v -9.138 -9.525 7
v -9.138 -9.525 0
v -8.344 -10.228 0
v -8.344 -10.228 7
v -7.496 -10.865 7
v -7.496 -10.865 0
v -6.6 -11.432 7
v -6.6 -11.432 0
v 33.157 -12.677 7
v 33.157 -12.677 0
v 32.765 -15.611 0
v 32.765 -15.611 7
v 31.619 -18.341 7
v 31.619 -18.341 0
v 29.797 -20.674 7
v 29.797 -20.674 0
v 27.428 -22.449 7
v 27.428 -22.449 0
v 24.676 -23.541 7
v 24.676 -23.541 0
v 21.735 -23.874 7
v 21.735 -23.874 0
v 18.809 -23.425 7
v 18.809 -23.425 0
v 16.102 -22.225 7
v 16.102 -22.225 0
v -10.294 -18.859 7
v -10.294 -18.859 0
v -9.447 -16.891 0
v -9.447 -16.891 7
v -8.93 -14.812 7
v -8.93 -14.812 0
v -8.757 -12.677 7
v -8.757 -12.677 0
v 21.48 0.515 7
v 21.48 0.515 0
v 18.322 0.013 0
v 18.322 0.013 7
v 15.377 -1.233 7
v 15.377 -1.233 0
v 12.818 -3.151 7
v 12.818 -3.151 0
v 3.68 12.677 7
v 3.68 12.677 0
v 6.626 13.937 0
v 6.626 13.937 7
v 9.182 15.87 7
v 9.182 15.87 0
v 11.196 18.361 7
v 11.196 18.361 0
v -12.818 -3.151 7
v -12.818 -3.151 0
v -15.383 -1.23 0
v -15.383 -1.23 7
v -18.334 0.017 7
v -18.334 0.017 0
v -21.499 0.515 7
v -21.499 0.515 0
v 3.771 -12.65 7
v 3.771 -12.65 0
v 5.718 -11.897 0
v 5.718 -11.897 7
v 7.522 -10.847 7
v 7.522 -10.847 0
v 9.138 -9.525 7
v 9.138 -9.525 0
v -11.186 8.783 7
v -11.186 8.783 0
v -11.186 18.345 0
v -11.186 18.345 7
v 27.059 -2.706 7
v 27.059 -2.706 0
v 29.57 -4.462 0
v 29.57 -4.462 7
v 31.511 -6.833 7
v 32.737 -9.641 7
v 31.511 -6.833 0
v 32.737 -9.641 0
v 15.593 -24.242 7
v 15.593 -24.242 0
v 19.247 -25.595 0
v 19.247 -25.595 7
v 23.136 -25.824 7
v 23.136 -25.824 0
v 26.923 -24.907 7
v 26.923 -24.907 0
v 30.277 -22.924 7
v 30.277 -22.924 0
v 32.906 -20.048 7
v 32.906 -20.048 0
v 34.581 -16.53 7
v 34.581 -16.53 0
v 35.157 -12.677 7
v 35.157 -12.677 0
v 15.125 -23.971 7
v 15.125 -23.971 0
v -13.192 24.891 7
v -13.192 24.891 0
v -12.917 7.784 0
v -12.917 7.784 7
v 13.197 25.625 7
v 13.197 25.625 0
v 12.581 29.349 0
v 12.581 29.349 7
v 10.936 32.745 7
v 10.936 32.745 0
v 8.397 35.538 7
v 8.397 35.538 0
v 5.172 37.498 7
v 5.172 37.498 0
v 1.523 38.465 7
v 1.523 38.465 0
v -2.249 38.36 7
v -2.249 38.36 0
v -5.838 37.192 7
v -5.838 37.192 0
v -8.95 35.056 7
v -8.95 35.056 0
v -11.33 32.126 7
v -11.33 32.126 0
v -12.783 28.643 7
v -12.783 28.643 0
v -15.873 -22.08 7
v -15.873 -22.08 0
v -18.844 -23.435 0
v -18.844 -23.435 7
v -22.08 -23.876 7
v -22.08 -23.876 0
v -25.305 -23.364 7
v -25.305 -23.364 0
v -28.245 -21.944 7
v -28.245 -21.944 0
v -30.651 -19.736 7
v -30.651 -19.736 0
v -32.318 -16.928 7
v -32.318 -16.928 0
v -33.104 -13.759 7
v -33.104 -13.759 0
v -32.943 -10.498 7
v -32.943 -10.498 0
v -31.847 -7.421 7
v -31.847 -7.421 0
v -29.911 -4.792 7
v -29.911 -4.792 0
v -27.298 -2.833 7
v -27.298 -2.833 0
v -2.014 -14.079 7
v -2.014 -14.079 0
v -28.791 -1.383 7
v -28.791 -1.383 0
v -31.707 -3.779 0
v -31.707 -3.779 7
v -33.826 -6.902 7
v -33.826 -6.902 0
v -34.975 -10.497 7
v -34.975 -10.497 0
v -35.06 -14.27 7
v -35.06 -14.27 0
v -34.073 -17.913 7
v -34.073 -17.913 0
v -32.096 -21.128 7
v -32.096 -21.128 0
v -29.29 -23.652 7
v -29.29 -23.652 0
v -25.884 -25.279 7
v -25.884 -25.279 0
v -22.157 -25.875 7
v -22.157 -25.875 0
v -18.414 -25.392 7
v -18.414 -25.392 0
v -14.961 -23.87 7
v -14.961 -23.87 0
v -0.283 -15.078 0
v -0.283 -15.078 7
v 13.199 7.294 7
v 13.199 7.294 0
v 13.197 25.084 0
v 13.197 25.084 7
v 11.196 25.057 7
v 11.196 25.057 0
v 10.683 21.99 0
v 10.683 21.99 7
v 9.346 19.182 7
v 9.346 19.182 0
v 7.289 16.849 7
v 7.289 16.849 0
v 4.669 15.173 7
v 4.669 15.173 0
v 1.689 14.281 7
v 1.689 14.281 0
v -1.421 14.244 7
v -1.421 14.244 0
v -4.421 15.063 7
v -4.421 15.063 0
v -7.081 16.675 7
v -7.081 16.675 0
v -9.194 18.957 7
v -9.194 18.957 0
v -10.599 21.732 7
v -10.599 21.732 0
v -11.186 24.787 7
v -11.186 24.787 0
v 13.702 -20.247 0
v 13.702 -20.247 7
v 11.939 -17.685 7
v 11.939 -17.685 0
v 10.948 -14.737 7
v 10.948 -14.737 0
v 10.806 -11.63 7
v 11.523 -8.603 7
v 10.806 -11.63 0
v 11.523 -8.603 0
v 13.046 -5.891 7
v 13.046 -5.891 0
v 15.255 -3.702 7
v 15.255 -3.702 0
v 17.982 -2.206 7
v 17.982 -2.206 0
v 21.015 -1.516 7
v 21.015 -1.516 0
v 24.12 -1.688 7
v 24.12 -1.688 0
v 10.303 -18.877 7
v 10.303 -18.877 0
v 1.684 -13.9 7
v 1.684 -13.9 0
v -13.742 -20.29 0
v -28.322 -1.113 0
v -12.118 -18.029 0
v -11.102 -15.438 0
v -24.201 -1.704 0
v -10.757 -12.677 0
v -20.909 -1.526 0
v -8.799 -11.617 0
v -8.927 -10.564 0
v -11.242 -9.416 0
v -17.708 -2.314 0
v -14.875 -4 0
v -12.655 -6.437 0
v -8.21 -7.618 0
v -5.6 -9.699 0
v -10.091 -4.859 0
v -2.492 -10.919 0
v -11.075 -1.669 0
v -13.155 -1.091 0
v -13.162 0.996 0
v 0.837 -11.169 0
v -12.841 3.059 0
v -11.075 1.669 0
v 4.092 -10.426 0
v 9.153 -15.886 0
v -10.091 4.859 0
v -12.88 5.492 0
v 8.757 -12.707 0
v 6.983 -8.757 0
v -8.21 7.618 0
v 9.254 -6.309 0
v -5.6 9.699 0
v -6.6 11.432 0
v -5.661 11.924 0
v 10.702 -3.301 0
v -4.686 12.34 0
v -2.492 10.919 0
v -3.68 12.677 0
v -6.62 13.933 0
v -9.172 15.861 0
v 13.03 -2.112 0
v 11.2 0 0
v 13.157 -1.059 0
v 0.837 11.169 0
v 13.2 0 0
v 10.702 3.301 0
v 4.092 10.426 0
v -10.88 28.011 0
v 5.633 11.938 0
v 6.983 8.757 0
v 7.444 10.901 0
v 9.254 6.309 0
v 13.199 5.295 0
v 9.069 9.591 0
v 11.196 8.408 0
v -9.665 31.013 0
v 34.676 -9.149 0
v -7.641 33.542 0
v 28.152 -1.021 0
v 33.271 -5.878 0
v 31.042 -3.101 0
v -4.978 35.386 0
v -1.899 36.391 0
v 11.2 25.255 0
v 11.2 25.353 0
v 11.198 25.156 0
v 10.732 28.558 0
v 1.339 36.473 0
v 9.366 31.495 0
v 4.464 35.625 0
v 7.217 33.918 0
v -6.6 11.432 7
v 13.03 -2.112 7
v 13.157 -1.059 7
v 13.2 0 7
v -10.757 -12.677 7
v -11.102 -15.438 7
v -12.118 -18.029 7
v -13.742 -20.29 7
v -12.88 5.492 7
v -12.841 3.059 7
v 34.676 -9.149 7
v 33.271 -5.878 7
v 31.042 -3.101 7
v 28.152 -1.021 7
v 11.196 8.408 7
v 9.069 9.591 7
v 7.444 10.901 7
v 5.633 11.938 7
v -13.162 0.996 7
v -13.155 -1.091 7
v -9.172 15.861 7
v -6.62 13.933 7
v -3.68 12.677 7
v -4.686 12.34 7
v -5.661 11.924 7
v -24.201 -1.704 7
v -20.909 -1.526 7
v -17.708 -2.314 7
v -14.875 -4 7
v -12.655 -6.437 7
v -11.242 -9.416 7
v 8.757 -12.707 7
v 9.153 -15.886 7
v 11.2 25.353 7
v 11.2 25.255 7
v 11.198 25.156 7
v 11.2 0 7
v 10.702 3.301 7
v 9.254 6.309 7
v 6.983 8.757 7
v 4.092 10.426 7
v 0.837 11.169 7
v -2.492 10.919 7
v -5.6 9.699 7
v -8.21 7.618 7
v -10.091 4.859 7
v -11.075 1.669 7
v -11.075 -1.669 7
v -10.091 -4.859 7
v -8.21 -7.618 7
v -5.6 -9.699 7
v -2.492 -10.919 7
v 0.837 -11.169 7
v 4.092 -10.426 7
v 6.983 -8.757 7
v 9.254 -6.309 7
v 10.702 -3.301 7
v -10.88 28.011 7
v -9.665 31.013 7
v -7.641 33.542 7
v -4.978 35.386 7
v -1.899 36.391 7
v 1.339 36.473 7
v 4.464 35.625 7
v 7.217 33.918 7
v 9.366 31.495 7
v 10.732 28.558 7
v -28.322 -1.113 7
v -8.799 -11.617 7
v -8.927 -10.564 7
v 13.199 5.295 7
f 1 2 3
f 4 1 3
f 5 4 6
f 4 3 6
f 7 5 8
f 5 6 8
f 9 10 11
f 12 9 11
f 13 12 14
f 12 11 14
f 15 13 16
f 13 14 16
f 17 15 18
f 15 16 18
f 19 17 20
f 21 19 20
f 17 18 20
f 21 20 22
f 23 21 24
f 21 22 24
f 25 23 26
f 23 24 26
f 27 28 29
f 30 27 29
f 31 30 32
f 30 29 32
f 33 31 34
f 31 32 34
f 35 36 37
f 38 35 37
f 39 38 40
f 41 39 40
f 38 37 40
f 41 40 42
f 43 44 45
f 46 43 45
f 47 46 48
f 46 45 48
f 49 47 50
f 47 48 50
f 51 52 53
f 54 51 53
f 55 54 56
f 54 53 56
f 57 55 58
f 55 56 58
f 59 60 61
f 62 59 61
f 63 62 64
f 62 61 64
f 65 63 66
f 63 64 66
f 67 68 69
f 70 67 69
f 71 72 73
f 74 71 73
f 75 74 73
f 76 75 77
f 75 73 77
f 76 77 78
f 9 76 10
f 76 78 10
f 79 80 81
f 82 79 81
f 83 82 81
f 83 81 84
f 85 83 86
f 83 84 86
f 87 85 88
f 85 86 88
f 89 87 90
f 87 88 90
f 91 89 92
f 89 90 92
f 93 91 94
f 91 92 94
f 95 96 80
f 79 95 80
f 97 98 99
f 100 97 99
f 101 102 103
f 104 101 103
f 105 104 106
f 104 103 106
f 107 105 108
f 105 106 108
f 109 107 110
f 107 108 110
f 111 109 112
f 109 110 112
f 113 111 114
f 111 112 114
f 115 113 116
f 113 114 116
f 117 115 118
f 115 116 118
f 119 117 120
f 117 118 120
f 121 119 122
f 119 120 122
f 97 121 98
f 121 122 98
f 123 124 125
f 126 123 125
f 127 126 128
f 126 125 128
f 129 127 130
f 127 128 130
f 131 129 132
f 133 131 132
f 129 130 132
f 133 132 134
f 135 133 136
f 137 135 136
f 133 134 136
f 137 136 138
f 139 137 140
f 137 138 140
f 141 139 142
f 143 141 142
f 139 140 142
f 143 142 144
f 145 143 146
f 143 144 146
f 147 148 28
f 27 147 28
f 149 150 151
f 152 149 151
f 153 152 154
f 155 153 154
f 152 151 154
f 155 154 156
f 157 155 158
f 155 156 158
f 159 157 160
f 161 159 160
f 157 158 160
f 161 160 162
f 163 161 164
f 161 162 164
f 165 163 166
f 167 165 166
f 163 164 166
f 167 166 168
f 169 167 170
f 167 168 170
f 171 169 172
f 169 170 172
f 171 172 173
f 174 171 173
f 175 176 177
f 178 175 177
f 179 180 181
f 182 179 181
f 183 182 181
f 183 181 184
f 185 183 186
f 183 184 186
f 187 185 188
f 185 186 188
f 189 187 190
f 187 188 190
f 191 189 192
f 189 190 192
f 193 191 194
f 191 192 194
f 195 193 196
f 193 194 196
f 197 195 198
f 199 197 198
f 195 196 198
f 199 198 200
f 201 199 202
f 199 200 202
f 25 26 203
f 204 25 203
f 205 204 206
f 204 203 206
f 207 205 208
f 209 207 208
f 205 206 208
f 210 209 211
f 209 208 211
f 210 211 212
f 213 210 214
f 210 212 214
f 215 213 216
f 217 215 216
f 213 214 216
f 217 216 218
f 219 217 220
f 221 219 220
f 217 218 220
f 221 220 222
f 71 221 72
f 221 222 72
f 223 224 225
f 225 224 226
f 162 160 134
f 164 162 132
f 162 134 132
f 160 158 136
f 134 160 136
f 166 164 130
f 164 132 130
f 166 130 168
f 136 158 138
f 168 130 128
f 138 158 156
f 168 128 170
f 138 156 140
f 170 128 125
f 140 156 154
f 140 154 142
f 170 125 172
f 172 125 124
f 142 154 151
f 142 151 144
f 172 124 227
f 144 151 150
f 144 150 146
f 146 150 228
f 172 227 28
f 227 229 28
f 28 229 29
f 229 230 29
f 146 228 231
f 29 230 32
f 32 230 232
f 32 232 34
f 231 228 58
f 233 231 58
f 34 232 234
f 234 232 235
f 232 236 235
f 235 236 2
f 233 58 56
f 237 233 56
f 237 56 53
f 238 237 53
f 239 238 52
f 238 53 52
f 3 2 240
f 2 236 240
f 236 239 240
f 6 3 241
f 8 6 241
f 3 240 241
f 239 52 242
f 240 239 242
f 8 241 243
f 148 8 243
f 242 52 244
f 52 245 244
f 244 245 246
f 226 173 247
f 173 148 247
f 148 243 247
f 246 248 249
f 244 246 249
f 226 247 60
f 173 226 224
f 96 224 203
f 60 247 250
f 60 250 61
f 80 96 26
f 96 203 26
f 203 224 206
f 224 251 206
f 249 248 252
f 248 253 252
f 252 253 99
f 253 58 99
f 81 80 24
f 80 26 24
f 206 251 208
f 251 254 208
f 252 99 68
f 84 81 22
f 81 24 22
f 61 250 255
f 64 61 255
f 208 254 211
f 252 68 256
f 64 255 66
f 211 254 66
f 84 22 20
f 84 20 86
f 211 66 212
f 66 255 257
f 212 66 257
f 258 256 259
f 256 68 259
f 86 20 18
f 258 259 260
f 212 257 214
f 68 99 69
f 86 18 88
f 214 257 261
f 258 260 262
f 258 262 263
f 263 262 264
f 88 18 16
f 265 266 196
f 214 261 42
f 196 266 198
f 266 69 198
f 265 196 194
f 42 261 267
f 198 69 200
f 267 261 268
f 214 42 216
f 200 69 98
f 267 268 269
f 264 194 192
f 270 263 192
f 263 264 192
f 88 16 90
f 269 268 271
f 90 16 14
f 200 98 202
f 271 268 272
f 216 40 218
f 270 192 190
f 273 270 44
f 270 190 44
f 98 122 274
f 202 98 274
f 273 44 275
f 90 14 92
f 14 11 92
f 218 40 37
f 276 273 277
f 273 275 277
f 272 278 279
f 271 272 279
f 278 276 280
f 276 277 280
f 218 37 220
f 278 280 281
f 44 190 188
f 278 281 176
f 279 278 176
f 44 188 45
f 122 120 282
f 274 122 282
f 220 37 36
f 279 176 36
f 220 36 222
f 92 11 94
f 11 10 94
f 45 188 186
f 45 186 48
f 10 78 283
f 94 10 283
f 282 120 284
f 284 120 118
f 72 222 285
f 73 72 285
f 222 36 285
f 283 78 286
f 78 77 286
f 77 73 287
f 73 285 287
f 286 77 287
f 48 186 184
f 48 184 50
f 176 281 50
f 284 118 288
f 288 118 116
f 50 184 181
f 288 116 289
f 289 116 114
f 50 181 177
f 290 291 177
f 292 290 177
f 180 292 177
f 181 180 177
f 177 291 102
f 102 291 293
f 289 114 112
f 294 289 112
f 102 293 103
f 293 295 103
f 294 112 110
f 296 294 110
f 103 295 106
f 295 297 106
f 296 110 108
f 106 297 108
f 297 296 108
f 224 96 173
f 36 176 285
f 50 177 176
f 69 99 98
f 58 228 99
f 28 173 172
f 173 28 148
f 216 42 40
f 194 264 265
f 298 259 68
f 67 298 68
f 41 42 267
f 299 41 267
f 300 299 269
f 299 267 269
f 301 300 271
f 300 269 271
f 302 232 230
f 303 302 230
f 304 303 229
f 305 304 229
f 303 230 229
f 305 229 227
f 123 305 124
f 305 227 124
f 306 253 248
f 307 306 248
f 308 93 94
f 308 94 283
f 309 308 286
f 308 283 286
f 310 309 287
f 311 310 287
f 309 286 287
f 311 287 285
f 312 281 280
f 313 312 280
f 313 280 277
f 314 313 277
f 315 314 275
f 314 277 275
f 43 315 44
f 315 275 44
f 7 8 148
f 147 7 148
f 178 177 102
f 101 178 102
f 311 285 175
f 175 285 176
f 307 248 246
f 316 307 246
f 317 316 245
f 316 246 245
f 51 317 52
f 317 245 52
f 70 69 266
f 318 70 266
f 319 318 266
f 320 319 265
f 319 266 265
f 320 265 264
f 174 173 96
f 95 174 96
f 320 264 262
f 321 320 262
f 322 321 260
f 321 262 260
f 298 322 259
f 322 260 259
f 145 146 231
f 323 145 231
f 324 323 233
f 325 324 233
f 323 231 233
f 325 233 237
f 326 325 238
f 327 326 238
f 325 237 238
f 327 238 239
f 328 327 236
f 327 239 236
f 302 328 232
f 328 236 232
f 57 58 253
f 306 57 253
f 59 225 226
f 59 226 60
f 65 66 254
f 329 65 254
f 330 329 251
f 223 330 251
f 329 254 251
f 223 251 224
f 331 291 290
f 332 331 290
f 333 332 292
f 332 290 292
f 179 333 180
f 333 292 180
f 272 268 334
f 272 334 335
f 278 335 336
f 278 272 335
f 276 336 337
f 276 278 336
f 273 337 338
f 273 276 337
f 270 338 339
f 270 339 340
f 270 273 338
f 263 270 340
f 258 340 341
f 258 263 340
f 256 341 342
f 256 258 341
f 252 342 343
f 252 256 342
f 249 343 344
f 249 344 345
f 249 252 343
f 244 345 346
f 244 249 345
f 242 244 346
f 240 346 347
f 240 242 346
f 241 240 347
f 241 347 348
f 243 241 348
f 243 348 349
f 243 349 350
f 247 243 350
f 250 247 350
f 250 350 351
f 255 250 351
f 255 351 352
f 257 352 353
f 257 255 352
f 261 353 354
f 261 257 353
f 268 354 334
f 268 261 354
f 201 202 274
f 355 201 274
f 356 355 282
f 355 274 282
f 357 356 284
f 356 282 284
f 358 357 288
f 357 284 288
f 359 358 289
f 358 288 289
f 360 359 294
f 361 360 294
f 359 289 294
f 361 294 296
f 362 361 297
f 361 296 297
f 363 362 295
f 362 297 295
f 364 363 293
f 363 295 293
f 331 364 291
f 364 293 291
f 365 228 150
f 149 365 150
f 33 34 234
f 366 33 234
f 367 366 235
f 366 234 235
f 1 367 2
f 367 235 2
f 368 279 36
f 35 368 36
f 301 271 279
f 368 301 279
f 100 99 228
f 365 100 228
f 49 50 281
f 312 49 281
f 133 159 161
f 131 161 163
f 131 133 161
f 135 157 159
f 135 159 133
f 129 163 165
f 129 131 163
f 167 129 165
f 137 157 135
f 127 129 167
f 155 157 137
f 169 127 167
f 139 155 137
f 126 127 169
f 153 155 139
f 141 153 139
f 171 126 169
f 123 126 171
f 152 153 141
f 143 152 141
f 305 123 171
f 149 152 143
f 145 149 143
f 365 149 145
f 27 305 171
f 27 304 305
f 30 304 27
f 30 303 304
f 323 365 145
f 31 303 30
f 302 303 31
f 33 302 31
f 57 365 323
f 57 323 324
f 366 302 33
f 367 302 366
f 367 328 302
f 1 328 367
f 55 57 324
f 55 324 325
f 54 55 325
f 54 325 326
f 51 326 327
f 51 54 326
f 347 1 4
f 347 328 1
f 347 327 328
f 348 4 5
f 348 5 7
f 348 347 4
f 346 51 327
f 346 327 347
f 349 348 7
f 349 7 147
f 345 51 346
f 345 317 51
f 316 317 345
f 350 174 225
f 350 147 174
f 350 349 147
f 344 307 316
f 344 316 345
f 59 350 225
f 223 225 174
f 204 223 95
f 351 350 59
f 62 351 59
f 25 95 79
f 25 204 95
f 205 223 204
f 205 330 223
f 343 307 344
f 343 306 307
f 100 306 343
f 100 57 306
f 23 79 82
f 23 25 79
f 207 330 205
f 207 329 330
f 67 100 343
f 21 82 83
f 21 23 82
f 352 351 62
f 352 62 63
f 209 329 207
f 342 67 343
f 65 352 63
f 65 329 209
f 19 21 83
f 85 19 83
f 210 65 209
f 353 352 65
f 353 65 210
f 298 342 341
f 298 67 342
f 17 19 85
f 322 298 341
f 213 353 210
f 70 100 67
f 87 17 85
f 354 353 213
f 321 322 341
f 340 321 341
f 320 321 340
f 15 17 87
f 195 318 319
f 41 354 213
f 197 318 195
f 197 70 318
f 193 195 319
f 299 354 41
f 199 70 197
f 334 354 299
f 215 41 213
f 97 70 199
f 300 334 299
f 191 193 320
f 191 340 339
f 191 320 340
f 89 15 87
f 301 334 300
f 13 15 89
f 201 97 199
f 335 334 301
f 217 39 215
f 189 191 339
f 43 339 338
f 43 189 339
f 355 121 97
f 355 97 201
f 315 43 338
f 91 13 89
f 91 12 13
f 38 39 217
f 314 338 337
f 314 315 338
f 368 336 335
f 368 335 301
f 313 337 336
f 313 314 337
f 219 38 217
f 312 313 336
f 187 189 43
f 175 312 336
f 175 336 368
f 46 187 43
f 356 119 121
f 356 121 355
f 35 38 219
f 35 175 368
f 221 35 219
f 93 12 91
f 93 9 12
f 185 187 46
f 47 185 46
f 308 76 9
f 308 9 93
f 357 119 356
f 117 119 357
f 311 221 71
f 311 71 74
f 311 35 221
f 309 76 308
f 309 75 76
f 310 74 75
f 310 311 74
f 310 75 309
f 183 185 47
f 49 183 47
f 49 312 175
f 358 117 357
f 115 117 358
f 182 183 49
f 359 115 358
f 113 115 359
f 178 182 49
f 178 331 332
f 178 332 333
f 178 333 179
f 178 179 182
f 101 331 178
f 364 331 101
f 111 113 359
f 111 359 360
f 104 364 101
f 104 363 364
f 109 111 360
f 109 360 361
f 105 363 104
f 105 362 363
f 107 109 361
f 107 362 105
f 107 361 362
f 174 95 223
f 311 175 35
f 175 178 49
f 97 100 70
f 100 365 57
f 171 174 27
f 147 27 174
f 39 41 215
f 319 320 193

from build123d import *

# Parameters (mm, degrees)
F0_R     = 11.2
F1_DEPTH = 7


with BuildPart() as f1:
    # F0 (on Top) → F1 (new body)
    with BuildSketch(Plane.XY):
        with BuildLine():
            ThreePointArc((11.1960937773, 18.3612549308), (12.6514347683, 21.5874202803), (13.1972607258, 25.0843095102))
            Line((13.1972607258, 25.0843095102), (13.1972016792, 25.6249998472))
            ThreePointArc((13.1972016792, 25.6249998472), (-0.3668592076, 38.5481145369), (-13.1919155694, 24.8913004743))
            ThreePointArc((-13.1919155694, 24.8913004743), (-12.6206771495, 21.4855903841), (-11.1856658992, 18.3445846116))
            Line((-11.1856658992, 18.3445846116), (-11.1856658992, 24.7867521761))
            ThreePointArc((-11.1856658992, 24.7867521761), (-0.2833213093, 36.5496293654), (11.2, 25.353213464))
            ThreePointArc((11.2, 25.353213464), (11.1990234017, 25.2053119859), (11.1960937773, 25.0574363006))
            Line((11.1960937773, 25.0574363006), (11.1960937773, 18.3612549308))
        make_face()
        with BuildLine():
            ThreePointArc((-11.1856658992, 18.3445846116), (-12.6206771495, 21.4855903841), (-13.1919155694, 24.8913004743))
            Line((-13.1919155694, 24.8913004743), (-12.91669885, 7.7836678209))
            Line((-12.91669885, 7.7836678209), (-11.1856658992, 8.7833322288))
            Line((-11.1856658992, 8.7833322288), (-11.1856658992, 18.3445846116))
        make_face()
        with BuildLine():
            Line((11.1960937773, 8.4082804197), (13.1992034925, 7.2943554266))
            Line((13.1992034925, 7.2943554266), (13.1972607258, 25.0843095102))
            ThreePointArc((13.1972607258, 25.0843095102), (12.6514347683, 21.5874202803), (11.1960937773, 18.3612549308))
            Line((11.1960937773, 18.3612549308), (11.1960937773, 8.4082804197))
        make_face()
        with BuildLine():
            ThreePointArc((-3.6801687137, 12.676606732), (0, 12.153213464), (3.6801687137, 12.676606732))
            ThreePointArc((3.6801687137, 12.676606732), (0, 13.2), (-3.6801687137, 12.676606732))
        make_face()
        with BuildLine():
            ThreePointArc((-3.6801687137, 12.676606732), (0, 13.2), (3.6801687137, 12.676606732))
            ThreePointArc((3.6801687137, 12.676606732), (7.9627007172, 14.8253743083), (11.1960937773, 18.3612549308))
            Line((11.1960937773, 18.3612549308), (11.1960937773, 25.0574363006))
            ThreePointArc((11.1960937773, 25.0574363006), (0.1354424563, 14.154032452), (-11.1856658992, 24.7867521761))
            Line((-11.1856658992, 24.7867521761), (-11.1856658992, 18.3445846116))
            ThreePointArc((-11.1856658992, 18.3445846116), (-7.9548571952, 14.8194464738), (-3.6801687137, 12.676606732))
        make_face()
        with BuildLine():
            ThreePointArc((11.1960937773, 6.9919585332), (11.4364479512, 6.5914837677), (11.6624835815, 6.1827564008))
            Line((11.6624835815, 6.1827564008), (13.1994217896, 5.2954047126))
            Line((13.1994217896, 5.2954047126), (13.1992034925, 7.2943554266))
            Line((13.1992034925, 7.2943554266), (11.1960937773, 8.4082804197))
            Line((11.1960937773, 8.4082804197), (11.1960937773, 6.9919585332))
        make_face()
        with BuildLine():
            Line((13.1992034925, 7.2943554266), (13.1994217896, 5.2954047126))
            Line((13.1994217896, 5.2954047126), (21.4797092452, 0.5147785212))
            ThreePointArc((21.4797092452, 0.5147785212), (24.9174056627, 0.1870318324), (28.1524563287, -1.0211162295))
            Line((28.1524563287, -1.0211162295), (13.1992034925, 7.2943554266))
        make_face()
        with BuildLine():
            ThreePointArc((11.6624835815, 6.1827564008), (12.8098552544, 3.1855310958), (13.2, 0))
            Line((13.2000000787, 0), (13.1994217896, 5.2954047126))
            Line((13.1994217896, 5.2954047126), (11.6624835815, 6.1827564008))
        make_face()
        with BuildLine():
            ThreePointArc((-11.1856658992, 7.0086288524), (-9.1636784807, 9.5008945212), (-6.6, 11.43153533))
            Line((-6.6000000394, 11.4315353981), (-11.1856658992, 8.7833322288))
            Line((-11.1856658992, 8.7833322288), (-11.1856658992, 7.0086288524))
        make_face()
        with BuildLine():
            Line((-11.1856658992, 8.7833322288), (-12.91669885, 7.7836678209))
            Line((-12.91669885, 7.7836678209), (-12.8798313342, 5.4919614244))
            Line((-12.8798313342, 5.4919614244), (-11.6532606006, 6.2001223677))
            ThreePointArc((-11.6532606006, 6.2001223677), (-11.4266163671, 6.6085125709), (-11.1856658992, 7.0086288524))
            Line((-11.1856658992, 7.0086288524), (-11.1856658992, 8.7833322288))
        make_face()
        with BuildLine():
            Line((-12.8798313342, 5.4919614244), (-12.91669885, 7.7836678209))
            Line((-12.91669885, 7.7836678209), (-28.3222796351, -1.1129917062))
            ThreePointArc((-28.3222796351, -1.1129917062), (-25.020971749, 0.1627537636), (-21.4993601041, 0.5154741689))
            Line((-21.4993601041, 0.5154741689), (-12.8798313342, 5.4919614244))
        make_face()
        with BuildLine():
            ThreePointArc((-28.7905016793, -1.3833880105), (-33.2002168531, -19.5917666618), (-14.9605407593, -23.8701842448))
            ThreePointArc((-14.9605407593, -23.8701842448), (-12.2967285132, -21.6726222165), (-10.2940433459, -18.8593631328))
            Line((-10.2940433459, -18.8593631328), (-15.8731241122, -22.0804469151))
            ThreePointArc((-15.8731241122, -22.0804469151), (-31.5875809573, -18.393493846), (-27.2984232787, -2.832616516))
            Line((-27.2984232787, -2.832616516), (-21.4993601041, 0.5154741689))
            ThreePointArc((-21.4993601041, 0.5154741689), (-25.020971749, 0.1627537636), (-28.3222796351, -1.1129917062))
            Line((-28.3222796351, -1.1129917062), (-28.7905016793, -1.3833880105))
        make_face()
        with BuildLine():
            ThreePointArc((-8.7565269274, -12.676606732), (-8.8522873228, -11.0895010695), (-9.1381791068, -9.5254229623))
            ThreePointArc((-9.1381791068, -9.5254229623), (-11.43153533, -6.6), (-12.8183478206, -3.1511837697))
            ThreePointArc((-12.8183478206, -3.1511837697), (-16.8205011302, -0.5167860504), (-21.4993601041, 0.5154741689))
            Line((-21.4993601041, 0.5154741689), (-27.2984232787, -2.832616516))
            ThreePointArc((-27.2984232787, -2.832616516), (-16.2289287892, -3.0519187076), (-10.7565269274, -12.676606732))
            ThreePointArc((-10.7565269274, -12.676606732), (-12.1184856709, -18.0294512314), (-15.8731241122, -22.0804469151))
            Line((-15.8731241122, -22.0804469151), (-10.2940433459, -18.8593631328))
            ThreePointArc((-10.2940433459, -18.8593631328), (-9.1466716731, -15.8621378278), (-8.7565269274, -12.676606732))
        make_face()
        with BuildLine():
            Line((-2.0137558904, -14.0787369414), (-0.4768176823, -13.1913852532))
            ThreePointArc((-0.4768176823, -13.1913852532), (-3.6461767737, -12.686425617), (-6.6, -11.43153533))
            Line((-6.6000000394, -11.4315353981), (-2.0137558904, -14.0787369414))
        make_face()
        with BuildLine():
            ThreePointArc((12.8183478206, -3.1511837697), (13.1042396046, -1.5871056626), (13.2, 0))
            ThreePointArc((13.2, 0), (12.8098552544, 3.1855310958), (11.6624835815, 6.1827564008))
            ThreePointArc((11.6624835815, 6.1827564008), (11.4364479512, 6.5914837677), (11.1960937773, 6.9919585332))
            ThreePointArc((11.1960937773, 6.9919585332), (10.2157365995, 8.3593495997), (9.0694054488, 9.590927213))
            ThreePointArc((9.0694054488, 9.590927213), (6.5588310586, 11.4552055916), (3.6801687137, 12.676606732))
            ThreePointArc((3.6801687137, 12.676606732), (0, 12.153213464), (-3.6801687137, 12.676606732))
            ThreePointArc((-3.6801687137, 12.676606732), (-5.1776459801, 12.1421572262), (-6.6, 11.43153533))
            ThreePointArc((-6.6, 11.43153533), (-9.1636784807, 9.5008945212), (-11.1856658992, 7.0086288524))
            ThreePointArc((-11.1856658992, 7.0086288524), (-11.4266163671, 6.6085125709), (-11.6532606006, 6.2001223677))
            ThreePointArc((-11.6532606006, 6.2001223677), (-12.3472774122, 4.6674126137), (-12.8406893367, 3.0588719094))
            ThreePointArc((-12.8406893367, 3.0588719094), (-13.1999145772, -0.0474884799), (-12.8183478206, -3.1511837697))
            ThreePointArc((-12.8183478206, -3.1511837697), (-10.5249915975, -6.076606732), (-9.1381791068, -9.5254229623))
            ThreePointArc((-9.1381791068, -9.5254229623), (-7.9265936246, -10.5550515636), (-6.6, -11.43153533))
            ThreePointArc((-6.6, -11.43153533), (-3.6461767737, -12.686425617), (-0.4768176823, -13.1913852532))
            ThreePointArc((-0.4768176823, -13.1913852532), (-0.0098315841, -13.1999963386), (0.4571668233, -13.1920809009))
            ThreePointArc((0.4571668233, -13.1920809009), (2.1315408127, -13.0267622134), (3.7712838879, -12.6497991224))
            ThreePointArc((3.7712838879, -12.6497991224), (6.6410835186, -11.4077171117), (9.1381791068, -9.5254229623))
            ThreePointArc((9.1381791068, -9.5254229623), (10.5249915975, -6.076606732), (12.8183478206, -3.1511837697))
        make_face()
        Circle(F0_R, mode=Mode.SUBTRACT)
        with BuildLine():
            ThreePointArc((28.1524563287, -1.0211162295), (24.9174056627, 0.1870318324), (21.4797092452, 0.5147785212))
            Line((21.4797092452, 0.5147785212), (27.0587900115, -2.7063052611))
            ThreePointArc((27.0587900115, -2.7063052611), (31.5112468747, -6.8330353301), (33.1565269274, -12.676606732))
            ThreePointArc((33.1565269274, -12.676606732), (27.4279521909, -22.4491962346), (16.1023295014, -22.2248197846))
            Line((16.1023295014, -22.2248197846), (10.3032663268, -18.8767290997))
            ThreePointArc((10.3032663268, -18.8767290997), (12.369536981, -21.7501740441), (15.1250189101, -23.9713178044))
            Line((15.1250189101, -23.9713178044), (15.5933, -24.2416118367))
            ThreePointArc((15.5933, -24.2416118367), (28.6738703219, -24.0395859946), (35.1565269274, -12.676606732))
            ThreePointArc((35.1565269274, -12.676606732), (33.2708158599, -5.8775725395), (28.1524563287, -1.0211162295))
        make_face()
        with BuildLine():
            ThreePointArc((21.4797092452, 0.5147785212), (16.811445714, -0.5206148224), (12.8183478206, -3.1511837697))
            ThreePointArc((12.8183478206, -3.1511837697), (11.43153533, -6.6), (9.1381791068, -9.5254229623))
            ThreePointArc((9.1381791068, -9.5254229623), (8.857800413, -14.308588258), (10.3032663268, -18.8767290997))
            Line((10.3032663268, -18.8767290997), (16.1023295014, -22.2248197846))
            ThreePointArc((16.1023295014, -22.2248197846), (12.1900304413, -7.1943128339), (27.0587900115, -2.7063052611))
            Line((27.0587900115, -2.7063052611), (21.4797092452, 0.5147785212))
        make_face()
        with BuildLine():
            ThreePointArc((-12.8183478206, -3.1511837697), (-11.43153533, -6.6), (-9.1381791068, -9.5254229623))
            ThreePointArc((-9.1381791068, -9.5254229623), (-10.5249915975, -6.076606732), (-12.8183478206, -3.1511837697))
        make_face()
        with BuildLine():
            ThreePointArc((9.1381791068, -9.5254229623), (11.43153533, -6.6), (12.8183478206, -3.1511837697))
            ThreePointArc((12.8183478206, -3.1511837697), (10.5249915975, -6.076606732), (9.1381791068, -9.5254229623))
        make_face()
        with BuildLine():
            ThreePointArc((15.1250189101, -23.9713178044), (12.369536981, -21.7501740441), (10.3032663268, -18.8767290997))
            Line((10.3032663268, -18.8767290997), (1.6837375569, -13.9002418441))
            Line((1.6837375569, -13.9002418441), (-0.2825046426, -15.0780232476))
            Line((-0.2825046426, -15.0780232476), (15.1250189101, -23.9713178044))
        make_face()
        with BuildLine():
            Line((1.6837375569, -13.9002418441), (0.4571668233, -13.1920809009))
            ThreePointArc((0.4571668233, -13.1920809009), (-0.0098315841, -13.1999963386), (-0.4768176823, -13.1913852532))
            Line((-0.4768176823, -13.1913852532), (-2.0137558904, -14.0787369414))
            Line((-2.0137558904, -14.0787369414), (-0.2825046426, -15.0780232476))
            Line((-0.2825046426, -15.0780232476), (1.6837375569, -13.9002418441))
        make_face()
        with BuildLine():
            Line((-14.9605407593, -23.8701842448), (-0.2825046426, -15.0780232476))
            Line((-0.2825046426, -15.0780232476), (-2.0137558904, -14.0787369414))
            Line((-2.0137558904, -14.0787369414), (-10.2940433459, -18.8593631328))
            ThreePointArc((-10.2940433459, -18.8593631328), (-12.2967285132, -21.6726222165), (-14.9605407593, -23.8701842448))
        make_face()
        with BuildLine():
            Line((-11.6532606006, 6.2001223677), (-12.8798313342, 5.4919614244))
            Line((-12.8798313342, 5.4919614244), (-12.8406893367, 3.0588719094))
            ThreePointArc((-12.8406893367, 3.0588719094), (-12.3472774122, 4.6674126137), (-11.6532606006, 6.2001223677))
        make_face()
        with BuildLine():
            ThreePointArc((9.0694054488, 9.590927213), (10.2157365995, 8.3593495997), (11.1960937773, 6.9919585332))
            Line((11.1960937773, 6.9919585332), (11.1960937773, 8.4082804197))
            Line((11.1960937773, 8.4082804197), (9.0694054488, 9.590927213))
        make_face()
        with BuildLine():
            Line((1.6837375569, -13.9002418441), (3.7712838879, -12.6497991224))
            ThreePointArc((3.7712838879, -12.6497991224), (2.1315408127, -13.0267622134), (0.4571668233, -13.1920809009))
            Line((0.4571668233, -13.1920809009), (1.6837375569, -13.9002418441))
        make_face()
    extrude(amount=F1_DEPTH)


solid = f1.part
